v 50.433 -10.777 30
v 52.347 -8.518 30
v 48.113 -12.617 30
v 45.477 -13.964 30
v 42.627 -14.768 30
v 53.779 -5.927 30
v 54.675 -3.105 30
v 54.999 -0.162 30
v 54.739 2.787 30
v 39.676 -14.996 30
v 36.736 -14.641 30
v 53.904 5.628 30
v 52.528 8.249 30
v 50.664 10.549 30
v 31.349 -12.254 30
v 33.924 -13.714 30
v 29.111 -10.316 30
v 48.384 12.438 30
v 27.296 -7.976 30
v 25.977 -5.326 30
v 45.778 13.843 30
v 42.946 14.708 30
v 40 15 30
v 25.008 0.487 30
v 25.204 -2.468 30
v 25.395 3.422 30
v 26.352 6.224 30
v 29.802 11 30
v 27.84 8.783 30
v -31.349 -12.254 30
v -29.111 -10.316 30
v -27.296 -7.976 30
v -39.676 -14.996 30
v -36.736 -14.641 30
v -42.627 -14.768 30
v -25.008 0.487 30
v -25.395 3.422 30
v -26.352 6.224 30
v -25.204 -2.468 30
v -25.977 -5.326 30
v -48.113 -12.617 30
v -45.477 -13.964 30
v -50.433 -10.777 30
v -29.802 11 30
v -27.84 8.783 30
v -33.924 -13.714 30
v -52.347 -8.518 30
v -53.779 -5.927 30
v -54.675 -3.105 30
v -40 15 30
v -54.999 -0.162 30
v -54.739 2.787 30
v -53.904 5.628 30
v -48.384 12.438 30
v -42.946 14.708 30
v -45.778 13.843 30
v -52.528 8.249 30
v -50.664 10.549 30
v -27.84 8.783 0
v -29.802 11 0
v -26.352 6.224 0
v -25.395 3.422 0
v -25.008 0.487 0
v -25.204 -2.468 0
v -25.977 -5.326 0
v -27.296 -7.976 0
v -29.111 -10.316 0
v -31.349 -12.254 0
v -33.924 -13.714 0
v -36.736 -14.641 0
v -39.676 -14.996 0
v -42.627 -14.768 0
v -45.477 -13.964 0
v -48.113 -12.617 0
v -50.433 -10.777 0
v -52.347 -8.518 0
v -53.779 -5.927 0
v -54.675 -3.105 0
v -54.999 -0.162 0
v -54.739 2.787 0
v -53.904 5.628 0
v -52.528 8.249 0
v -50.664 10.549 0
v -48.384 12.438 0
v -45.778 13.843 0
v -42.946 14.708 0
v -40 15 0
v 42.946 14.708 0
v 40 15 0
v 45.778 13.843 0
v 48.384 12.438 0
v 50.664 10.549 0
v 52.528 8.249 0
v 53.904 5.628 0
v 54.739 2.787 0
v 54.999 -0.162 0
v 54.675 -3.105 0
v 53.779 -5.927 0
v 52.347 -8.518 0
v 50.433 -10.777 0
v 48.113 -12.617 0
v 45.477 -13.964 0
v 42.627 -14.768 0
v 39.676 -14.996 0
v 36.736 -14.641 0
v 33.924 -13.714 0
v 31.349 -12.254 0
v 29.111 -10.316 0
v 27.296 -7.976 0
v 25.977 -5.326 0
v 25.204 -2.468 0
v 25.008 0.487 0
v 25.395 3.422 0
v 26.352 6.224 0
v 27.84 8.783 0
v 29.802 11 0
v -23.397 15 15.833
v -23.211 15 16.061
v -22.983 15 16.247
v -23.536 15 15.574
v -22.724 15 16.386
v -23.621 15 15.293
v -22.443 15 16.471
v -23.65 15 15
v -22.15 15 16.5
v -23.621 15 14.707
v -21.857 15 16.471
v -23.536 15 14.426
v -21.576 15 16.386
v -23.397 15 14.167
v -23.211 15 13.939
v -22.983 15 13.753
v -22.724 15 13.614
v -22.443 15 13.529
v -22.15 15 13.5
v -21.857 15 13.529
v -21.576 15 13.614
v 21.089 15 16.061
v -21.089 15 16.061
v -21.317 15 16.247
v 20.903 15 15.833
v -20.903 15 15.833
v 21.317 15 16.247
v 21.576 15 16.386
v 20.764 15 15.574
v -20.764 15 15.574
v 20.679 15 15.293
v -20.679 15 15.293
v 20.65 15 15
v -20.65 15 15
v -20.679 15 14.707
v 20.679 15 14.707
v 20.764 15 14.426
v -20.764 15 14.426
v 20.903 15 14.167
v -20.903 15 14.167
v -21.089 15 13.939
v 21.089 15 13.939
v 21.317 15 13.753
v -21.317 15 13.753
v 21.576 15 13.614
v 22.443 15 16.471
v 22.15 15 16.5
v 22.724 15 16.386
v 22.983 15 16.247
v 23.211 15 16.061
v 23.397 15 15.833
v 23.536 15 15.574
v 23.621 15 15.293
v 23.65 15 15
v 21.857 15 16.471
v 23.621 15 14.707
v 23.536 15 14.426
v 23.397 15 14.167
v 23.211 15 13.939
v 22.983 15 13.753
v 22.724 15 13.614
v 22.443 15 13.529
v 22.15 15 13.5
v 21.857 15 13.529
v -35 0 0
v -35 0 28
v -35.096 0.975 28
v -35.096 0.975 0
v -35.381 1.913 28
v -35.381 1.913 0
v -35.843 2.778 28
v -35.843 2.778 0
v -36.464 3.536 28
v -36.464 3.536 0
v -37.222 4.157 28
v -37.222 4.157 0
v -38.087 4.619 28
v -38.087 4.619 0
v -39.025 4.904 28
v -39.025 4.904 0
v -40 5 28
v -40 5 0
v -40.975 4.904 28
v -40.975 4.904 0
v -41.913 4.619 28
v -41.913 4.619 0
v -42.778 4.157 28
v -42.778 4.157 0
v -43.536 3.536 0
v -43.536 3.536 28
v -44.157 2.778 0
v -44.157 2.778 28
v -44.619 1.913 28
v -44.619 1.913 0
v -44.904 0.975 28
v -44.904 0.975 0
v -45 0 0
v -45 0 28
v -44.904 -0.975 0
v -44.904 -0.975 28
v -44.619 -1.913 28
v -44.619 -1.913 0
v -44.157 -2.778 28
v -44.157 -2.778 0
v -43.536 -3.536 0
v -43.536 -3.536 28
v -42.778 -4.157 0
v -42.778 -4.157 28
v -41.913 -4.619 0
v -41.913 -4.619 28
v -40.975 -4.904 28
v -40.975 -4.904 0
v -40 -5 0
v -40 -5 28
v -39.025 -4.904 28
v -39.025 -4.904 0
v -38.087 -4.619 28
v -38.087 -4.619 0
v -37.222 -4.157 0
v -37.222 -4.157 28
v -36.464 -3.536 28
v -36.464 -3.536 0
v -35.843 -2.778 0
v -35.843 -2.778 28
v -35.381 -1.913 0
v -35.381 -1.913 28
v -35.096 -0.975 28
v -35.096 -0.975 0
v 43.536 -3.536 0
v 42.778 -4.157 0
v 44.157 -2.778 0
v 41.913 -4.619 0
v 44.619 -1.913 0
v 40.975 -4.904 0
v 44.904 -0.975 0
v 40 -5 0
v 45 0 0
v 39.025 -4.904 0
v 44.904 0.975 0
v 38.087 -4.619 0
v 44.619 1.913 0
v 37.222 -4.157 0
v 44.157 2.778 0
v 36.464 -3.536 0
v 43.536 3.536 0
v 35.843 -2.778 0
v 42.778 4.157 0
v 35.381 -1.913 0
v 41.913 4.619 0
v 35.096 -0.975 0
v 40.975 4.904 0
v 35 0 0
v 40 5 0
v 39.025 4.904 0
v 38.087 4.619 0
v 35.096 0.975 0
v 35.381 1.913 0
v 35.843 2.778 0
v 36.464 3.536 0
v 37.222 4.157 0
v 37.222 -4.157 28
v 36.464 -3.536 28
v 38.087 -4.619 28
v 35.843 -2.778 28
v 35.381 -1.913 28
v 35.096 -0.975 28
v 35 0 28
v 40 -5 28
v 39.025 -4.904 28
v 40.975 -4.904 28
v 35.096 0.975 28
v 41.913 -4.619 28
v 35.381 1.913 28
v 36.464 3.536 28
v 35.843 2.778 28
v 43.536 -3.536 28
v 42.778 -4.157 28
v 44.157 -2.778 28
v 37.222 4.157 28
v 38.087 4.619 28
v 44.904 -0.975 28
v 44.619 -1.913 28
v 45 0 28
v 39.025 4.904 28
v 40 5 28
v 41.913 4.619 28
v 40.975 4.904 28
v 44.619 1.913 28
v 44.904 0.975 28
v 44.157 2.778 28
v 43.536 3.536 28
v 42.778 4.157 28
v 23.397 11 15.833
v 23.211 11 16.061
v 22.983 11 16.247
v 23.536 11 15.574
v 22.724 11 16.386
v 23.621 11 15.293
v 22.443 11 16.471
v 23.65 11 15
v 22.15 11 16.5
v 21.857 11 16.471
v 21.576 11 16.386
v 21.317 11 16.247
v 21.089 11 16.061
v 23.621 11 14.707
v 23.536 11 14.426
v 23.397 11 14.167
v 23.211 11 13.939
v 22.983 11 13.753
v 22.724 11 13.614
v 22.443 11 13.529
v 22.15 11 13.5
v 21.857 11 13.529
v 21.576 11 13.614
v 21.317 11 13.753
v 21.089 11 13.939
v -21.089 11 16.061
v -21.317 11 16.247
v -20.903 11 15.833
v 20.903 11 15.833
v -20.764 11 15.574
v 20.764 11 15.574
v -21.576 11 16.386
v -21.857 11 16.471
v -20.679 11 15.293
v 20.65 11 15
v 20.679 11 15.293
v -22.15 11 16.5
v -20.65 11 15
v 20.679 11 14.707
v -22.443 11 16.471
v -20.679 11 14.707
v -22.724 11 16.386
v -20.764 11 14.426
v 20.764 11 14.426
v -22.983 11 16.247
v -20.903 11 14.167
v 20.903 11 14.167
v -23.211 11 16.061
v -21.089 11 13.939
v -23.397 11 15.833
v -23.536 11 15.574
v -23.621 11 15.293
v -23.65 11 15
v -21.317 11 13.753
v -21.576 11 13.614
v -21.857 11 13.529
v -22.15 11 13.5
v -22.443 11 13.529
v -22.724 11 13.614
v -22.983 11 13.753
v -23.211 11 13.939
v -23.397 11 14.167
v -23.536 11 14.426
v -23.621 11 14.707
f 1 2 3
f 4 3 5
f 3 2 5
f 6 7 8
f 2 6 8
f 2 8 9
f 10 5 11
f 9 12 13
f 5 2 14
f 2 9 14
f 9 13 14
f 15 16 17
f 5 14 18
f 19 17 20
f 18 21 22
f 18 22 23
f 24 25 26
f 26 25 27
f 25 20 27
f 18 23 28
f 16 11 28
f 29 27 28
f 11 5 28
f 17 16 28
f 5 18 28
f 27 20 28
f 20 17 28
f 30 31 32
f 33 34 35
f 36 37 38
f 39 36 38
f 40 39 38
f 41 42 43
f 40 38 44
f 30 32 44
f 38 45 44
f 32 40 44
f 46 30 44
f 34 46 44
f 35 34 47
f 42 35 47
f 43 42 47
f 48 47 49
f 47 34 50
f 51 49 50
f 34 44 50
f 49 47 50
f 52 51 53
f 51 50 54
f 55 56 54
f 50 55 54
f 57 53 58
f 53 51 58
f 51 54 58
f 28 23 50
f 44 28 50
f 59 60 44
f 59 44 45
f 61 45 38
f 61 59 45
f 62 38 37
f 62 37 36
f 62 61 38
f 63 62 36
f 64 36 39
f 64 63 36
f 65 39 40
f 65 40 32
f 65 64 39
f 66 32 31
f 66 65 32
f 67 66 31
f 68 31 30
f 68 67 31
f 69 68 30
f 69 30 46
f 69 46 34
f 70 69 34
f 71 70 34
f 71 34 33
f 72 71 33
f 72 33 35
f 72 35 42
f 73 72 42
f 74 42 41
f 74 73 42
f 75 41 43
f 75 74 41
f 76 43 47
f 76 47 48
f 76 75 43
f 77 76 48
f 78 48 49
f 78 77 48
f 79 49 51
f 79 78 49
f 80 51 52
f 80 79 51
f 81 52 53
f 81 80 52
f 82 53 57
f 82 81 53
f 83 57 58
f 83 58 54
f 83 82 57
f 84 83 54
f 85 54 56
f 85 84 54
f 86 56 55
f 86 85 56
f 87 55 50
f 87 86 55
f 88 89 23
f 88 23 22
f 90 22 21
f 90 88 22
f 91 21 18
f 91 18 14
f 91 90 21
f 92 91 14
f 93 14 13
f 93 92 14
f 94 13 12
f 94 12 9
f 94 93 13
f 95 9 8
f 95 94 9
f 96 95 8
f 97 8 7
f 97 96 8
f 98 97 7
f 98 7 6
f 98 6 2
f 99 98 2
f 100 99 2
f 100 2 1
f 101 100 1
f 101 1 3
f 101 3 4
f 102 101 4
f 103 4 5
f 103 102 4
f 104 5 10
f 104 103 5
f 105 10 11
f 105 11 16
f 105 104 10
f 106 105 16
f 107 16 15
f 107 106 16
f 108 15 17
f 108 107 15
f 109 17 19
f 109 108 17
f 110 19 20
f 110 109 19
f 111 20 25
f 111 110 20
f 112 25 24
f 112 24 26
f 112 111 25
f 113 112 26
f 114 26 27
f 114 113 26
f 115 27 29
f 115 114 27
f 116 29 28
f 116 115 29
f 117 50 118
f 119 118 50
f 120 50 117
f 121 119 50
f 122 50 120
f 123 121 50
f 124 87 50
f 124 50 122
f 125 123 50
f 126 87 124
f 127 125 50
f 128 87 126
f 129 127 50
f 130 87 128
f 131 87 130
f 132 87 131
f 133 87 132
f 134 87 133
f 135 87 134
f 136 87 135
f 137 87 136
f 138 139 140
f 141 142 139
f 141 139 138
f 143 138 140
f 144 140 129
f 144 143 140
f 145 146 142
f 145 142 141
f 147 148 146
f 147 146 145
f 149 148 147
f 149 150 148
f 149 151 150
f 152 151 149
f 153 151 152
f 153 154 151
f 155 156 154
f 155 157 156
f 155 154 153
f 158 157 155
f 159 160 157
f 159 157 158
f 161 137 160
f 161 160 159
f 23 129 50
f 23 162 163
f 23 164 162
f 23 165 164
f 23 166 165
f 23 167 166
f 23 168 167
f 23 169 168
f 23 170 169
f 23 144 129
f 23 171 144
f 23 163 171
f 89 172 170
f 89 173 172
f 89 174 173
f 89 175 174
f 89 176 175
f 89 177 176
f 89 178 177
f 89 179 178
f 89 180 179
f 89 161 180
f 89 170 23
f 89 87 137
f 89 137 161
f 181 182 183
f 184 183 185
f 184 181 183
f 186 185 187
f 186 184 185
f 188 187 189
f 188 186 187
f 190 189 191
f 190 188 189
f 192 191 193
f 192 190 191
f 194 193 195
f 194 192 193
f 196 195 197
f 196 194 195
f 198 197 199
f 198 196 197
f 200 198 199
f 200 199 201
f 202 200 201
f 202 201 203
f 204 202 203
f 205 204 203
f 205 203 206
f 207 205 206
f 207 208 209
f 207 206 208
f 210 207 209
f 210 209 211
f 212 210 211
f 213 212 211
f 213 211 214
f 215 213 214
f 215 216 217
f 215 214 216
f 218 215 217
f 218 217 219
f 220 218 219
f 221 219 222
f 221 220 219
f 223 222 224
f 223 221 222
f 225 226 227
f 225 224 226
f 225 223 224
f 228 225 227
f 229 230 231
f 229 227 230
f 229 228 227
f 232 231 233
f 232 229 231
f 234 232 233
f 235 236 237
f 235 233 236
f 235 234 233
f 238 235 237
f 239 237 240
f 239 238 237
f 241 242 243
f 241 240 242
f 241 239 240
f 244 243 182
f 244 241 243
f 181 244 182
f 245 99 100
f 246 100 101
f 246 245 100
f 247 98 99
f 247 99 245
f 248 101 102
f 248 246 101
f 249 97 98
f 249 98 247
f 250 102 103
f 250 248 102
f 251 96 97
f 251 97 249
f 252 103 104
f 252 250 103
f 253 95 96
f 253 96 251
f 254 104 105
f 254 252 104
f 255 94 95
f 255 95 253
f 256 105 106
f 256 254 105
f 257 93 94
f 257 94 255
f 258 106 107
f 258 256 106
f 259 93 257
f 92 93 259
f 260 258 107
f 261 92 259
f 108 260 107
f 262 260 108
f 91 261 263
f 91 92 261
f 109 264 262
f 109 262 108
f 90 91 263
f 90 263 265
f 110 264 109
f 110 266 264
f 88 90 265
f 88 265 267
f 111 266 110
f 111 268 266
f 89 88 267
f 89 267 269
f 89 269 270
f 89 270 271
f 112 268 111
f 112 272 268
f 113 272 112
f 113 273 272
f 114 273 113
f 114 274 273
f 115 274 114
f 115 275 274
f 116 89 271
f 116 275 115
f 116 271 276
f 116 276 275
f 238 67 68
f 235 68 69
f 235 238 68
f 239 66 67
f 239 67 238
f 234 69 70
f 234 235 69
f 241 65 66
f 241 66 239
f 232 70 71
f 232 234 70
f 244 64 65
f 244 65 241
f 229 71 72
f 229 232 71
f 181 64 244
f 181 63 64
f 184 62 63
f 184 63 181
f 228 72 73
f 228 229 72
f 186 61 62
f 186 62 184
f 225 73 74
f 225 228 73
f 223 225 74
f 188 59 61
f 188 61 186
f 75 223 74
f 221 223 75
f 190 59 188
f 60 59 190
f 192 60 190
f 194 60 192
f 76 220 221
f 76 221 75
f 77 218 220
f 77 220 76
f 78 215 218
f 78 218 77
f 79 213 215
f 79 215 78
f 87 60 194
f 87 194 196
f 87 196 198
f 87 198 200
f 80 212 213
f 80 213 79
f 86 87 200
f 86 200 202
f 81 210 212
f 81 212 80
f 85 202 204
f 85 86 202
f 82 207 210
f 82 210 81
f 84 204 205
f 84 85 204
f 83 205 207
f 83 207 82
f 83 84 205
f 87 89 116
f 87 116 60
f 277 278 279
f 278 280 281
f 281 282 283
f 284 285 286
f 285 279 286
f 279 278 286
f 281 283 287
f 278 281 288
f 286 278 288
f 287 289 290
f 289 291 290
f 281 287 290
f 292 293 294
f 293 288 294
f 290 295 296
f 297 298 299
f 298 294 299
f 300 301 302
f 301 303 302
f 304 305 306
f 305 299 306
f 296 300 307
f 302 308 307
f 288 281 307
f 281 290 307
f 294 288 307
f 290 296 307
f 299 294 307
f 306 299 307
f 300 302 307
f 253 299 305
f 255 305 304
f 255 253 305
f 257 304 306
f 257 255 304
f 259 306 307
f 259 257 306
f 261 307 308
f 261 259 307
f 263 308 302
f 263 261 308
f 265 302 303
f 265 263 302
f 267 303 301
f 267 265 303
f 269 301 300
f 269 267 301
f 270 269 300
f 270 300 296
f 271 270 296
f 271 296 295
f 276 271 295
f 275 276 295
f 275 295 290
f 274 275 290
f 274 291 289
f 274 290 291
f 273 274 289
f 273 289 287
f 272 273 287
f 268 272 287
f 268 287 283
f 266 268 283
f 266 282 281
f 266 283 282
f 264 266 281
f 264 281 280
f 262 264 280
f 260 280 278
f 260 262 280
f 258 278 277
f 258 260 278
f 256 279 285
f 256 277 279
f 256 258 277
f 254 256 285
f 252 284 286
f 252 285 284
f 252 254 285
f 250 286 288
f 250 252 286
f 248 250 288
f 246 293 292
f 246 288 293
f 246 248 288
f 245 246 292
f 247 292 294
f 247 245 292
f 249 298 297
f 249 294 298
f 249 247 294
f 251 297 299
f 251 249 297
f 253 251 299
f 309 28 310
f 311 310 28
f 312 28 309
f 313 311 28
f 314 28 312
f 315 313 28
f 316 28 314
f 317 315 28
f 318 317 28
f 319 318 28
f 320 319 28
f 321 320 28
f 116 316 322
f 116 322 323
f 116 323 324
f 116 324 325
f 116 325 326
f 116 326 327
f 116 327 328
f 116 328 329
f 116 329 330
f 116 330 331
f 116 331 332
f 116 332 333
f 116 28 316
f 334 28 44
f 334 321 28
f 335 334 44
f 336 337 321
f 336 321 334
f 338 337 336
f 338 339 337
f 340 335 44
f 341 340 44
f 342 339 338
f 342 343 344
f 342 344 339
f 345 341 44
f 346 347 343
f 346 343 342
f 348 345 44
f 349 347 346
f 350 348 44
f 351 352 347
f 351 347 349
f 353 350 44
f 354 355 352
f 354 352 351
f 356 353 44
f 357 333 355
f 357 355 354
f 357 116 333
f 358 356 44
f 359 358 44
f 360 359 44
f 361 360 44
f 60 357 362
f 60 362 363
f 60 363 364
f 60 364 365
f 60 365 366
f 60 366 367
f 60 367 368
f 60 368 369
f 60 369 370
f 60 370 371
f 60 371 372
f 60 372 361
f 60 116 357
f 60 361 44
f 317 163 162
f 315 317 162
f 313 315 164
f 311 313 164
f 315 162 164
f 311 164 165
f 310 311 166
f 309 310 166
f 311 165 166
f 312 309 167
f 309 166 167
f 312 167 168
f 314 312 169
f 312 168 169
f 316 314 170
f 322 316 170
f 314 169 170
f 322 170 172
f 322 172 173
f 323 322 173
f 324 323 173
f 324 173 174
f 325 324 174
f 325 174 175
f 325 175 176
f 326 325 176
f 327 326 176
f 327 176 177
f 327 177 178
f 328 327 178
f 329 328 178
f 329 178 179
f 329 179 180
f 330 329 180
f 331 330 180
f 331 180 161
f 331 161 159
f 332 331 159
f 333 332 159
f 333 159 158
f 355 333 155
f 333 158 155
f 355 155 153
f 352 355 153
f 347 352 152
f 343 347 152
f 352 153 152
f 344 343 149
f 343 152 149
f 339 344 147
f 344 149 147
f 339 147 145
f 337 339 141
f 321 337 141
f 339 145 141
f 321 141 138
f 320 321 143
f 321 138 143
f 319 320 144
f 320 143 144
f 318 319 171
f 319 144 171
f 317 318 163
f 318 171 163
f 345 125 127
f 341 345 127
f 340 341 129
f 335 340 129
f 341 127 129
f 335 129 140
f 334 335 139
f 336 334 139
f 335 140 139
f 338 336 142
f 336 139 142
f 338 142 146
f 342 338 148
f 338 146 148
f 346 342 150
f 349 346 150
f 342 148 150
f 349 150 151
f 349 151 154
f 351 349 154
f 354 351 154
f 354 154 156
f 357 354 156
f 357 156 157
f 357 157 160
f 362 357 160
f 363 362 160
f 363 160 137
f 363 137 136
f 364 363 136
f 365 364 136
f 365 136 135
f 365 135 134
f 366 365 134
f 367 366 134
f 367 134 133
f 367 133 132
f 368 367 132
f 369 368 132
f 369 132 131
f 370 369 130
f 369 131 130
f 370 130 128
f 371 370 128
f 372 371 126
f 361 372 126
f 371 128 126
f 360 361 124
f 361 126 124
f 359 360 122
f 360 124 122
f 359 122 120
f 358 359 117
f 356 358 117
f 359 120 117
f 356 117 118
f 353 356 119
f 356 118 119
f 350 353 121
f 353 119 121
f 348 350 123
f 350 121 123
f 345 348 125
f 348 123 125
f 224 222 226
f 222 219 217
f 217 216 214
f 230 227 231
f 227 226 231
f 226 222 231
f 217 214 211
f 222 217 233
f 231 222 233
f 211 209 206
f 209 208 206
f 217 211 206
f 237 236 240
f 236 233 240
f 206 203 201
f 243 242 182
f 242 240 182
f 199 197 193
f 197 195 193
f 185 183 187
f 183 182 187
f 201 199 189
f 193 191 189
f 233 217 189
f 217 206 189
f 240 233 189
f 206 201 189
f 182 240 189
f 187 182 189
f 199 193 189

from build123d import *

# Parameters (mm, degrees)
SKETCH1_R           = 5
BOSS_EXTRUDE1_DEPTH = 30
SKETCH3_R           = 1.5
CUT_EXTRUDE1_DEPTH  = 6
SKETCH5_R           = 9.45
BOSS_EXTRUDE2_DEPTH = 2


with BuildPart() as part:
    # Sketch1 → Boss-Extrude1 (new body)
    with BuildSketch(Plane.XY):
        with BuildLine():
            Line((-40, 15), (40, 15))
            ThreePointArc((40, 15), (45.476992863, -13.964331319), (29.802327604, 11.00033989))
            Line((29.802327604, 11.00033989), (-29.802327604, 11.00033989))
            ThreePointArc((-29.802327604, 11.00033989), (-45.476992863, -13.964331319), (-40, 15))
        make_face()
        with Locations((-40, 0)):
            Circle(SKETCH1_R, mode=Mode.SUBTRACT)
        with Locations((40, 0)):
            Circle(SKETCH1_R, mode=Mode.SUBTRACT)
    extrude(amount=BOSS_EXTRUDE1_DEPTH)

    # Sketch3 → Cut-Extrude1 (cut)
    with BuildSketch(Plane(origin=(0, 15, 0), x_dir=(1, 0, 0), z_dir=(0, 1, 0))):
        with Locations(Location((-22.15, -15, 0), (0, 0, 270))):
            Circle(SKETCH3_R)
        with Locations(Location((22.15, -15, 0), (0, 0, 270))):
            Circle(SKETCH3_R)
    extrude(amount=-CUT_EXTRUDE1_DEPTH, mode=Mode.SUBTRACT)

    # Sketch5 → Boss-Extrude2 (add)
    with BuildSketch(Plane.XY.offset(30)):
        with Locations((-40, 0)):
            Circle(SKETCH5_R)
        with Locations((40, 0)):
            Circle(SKETCH5_R)
    extrude(amount=-BOSS_EXTRUDE2_DEPTH)


solid = part.part
